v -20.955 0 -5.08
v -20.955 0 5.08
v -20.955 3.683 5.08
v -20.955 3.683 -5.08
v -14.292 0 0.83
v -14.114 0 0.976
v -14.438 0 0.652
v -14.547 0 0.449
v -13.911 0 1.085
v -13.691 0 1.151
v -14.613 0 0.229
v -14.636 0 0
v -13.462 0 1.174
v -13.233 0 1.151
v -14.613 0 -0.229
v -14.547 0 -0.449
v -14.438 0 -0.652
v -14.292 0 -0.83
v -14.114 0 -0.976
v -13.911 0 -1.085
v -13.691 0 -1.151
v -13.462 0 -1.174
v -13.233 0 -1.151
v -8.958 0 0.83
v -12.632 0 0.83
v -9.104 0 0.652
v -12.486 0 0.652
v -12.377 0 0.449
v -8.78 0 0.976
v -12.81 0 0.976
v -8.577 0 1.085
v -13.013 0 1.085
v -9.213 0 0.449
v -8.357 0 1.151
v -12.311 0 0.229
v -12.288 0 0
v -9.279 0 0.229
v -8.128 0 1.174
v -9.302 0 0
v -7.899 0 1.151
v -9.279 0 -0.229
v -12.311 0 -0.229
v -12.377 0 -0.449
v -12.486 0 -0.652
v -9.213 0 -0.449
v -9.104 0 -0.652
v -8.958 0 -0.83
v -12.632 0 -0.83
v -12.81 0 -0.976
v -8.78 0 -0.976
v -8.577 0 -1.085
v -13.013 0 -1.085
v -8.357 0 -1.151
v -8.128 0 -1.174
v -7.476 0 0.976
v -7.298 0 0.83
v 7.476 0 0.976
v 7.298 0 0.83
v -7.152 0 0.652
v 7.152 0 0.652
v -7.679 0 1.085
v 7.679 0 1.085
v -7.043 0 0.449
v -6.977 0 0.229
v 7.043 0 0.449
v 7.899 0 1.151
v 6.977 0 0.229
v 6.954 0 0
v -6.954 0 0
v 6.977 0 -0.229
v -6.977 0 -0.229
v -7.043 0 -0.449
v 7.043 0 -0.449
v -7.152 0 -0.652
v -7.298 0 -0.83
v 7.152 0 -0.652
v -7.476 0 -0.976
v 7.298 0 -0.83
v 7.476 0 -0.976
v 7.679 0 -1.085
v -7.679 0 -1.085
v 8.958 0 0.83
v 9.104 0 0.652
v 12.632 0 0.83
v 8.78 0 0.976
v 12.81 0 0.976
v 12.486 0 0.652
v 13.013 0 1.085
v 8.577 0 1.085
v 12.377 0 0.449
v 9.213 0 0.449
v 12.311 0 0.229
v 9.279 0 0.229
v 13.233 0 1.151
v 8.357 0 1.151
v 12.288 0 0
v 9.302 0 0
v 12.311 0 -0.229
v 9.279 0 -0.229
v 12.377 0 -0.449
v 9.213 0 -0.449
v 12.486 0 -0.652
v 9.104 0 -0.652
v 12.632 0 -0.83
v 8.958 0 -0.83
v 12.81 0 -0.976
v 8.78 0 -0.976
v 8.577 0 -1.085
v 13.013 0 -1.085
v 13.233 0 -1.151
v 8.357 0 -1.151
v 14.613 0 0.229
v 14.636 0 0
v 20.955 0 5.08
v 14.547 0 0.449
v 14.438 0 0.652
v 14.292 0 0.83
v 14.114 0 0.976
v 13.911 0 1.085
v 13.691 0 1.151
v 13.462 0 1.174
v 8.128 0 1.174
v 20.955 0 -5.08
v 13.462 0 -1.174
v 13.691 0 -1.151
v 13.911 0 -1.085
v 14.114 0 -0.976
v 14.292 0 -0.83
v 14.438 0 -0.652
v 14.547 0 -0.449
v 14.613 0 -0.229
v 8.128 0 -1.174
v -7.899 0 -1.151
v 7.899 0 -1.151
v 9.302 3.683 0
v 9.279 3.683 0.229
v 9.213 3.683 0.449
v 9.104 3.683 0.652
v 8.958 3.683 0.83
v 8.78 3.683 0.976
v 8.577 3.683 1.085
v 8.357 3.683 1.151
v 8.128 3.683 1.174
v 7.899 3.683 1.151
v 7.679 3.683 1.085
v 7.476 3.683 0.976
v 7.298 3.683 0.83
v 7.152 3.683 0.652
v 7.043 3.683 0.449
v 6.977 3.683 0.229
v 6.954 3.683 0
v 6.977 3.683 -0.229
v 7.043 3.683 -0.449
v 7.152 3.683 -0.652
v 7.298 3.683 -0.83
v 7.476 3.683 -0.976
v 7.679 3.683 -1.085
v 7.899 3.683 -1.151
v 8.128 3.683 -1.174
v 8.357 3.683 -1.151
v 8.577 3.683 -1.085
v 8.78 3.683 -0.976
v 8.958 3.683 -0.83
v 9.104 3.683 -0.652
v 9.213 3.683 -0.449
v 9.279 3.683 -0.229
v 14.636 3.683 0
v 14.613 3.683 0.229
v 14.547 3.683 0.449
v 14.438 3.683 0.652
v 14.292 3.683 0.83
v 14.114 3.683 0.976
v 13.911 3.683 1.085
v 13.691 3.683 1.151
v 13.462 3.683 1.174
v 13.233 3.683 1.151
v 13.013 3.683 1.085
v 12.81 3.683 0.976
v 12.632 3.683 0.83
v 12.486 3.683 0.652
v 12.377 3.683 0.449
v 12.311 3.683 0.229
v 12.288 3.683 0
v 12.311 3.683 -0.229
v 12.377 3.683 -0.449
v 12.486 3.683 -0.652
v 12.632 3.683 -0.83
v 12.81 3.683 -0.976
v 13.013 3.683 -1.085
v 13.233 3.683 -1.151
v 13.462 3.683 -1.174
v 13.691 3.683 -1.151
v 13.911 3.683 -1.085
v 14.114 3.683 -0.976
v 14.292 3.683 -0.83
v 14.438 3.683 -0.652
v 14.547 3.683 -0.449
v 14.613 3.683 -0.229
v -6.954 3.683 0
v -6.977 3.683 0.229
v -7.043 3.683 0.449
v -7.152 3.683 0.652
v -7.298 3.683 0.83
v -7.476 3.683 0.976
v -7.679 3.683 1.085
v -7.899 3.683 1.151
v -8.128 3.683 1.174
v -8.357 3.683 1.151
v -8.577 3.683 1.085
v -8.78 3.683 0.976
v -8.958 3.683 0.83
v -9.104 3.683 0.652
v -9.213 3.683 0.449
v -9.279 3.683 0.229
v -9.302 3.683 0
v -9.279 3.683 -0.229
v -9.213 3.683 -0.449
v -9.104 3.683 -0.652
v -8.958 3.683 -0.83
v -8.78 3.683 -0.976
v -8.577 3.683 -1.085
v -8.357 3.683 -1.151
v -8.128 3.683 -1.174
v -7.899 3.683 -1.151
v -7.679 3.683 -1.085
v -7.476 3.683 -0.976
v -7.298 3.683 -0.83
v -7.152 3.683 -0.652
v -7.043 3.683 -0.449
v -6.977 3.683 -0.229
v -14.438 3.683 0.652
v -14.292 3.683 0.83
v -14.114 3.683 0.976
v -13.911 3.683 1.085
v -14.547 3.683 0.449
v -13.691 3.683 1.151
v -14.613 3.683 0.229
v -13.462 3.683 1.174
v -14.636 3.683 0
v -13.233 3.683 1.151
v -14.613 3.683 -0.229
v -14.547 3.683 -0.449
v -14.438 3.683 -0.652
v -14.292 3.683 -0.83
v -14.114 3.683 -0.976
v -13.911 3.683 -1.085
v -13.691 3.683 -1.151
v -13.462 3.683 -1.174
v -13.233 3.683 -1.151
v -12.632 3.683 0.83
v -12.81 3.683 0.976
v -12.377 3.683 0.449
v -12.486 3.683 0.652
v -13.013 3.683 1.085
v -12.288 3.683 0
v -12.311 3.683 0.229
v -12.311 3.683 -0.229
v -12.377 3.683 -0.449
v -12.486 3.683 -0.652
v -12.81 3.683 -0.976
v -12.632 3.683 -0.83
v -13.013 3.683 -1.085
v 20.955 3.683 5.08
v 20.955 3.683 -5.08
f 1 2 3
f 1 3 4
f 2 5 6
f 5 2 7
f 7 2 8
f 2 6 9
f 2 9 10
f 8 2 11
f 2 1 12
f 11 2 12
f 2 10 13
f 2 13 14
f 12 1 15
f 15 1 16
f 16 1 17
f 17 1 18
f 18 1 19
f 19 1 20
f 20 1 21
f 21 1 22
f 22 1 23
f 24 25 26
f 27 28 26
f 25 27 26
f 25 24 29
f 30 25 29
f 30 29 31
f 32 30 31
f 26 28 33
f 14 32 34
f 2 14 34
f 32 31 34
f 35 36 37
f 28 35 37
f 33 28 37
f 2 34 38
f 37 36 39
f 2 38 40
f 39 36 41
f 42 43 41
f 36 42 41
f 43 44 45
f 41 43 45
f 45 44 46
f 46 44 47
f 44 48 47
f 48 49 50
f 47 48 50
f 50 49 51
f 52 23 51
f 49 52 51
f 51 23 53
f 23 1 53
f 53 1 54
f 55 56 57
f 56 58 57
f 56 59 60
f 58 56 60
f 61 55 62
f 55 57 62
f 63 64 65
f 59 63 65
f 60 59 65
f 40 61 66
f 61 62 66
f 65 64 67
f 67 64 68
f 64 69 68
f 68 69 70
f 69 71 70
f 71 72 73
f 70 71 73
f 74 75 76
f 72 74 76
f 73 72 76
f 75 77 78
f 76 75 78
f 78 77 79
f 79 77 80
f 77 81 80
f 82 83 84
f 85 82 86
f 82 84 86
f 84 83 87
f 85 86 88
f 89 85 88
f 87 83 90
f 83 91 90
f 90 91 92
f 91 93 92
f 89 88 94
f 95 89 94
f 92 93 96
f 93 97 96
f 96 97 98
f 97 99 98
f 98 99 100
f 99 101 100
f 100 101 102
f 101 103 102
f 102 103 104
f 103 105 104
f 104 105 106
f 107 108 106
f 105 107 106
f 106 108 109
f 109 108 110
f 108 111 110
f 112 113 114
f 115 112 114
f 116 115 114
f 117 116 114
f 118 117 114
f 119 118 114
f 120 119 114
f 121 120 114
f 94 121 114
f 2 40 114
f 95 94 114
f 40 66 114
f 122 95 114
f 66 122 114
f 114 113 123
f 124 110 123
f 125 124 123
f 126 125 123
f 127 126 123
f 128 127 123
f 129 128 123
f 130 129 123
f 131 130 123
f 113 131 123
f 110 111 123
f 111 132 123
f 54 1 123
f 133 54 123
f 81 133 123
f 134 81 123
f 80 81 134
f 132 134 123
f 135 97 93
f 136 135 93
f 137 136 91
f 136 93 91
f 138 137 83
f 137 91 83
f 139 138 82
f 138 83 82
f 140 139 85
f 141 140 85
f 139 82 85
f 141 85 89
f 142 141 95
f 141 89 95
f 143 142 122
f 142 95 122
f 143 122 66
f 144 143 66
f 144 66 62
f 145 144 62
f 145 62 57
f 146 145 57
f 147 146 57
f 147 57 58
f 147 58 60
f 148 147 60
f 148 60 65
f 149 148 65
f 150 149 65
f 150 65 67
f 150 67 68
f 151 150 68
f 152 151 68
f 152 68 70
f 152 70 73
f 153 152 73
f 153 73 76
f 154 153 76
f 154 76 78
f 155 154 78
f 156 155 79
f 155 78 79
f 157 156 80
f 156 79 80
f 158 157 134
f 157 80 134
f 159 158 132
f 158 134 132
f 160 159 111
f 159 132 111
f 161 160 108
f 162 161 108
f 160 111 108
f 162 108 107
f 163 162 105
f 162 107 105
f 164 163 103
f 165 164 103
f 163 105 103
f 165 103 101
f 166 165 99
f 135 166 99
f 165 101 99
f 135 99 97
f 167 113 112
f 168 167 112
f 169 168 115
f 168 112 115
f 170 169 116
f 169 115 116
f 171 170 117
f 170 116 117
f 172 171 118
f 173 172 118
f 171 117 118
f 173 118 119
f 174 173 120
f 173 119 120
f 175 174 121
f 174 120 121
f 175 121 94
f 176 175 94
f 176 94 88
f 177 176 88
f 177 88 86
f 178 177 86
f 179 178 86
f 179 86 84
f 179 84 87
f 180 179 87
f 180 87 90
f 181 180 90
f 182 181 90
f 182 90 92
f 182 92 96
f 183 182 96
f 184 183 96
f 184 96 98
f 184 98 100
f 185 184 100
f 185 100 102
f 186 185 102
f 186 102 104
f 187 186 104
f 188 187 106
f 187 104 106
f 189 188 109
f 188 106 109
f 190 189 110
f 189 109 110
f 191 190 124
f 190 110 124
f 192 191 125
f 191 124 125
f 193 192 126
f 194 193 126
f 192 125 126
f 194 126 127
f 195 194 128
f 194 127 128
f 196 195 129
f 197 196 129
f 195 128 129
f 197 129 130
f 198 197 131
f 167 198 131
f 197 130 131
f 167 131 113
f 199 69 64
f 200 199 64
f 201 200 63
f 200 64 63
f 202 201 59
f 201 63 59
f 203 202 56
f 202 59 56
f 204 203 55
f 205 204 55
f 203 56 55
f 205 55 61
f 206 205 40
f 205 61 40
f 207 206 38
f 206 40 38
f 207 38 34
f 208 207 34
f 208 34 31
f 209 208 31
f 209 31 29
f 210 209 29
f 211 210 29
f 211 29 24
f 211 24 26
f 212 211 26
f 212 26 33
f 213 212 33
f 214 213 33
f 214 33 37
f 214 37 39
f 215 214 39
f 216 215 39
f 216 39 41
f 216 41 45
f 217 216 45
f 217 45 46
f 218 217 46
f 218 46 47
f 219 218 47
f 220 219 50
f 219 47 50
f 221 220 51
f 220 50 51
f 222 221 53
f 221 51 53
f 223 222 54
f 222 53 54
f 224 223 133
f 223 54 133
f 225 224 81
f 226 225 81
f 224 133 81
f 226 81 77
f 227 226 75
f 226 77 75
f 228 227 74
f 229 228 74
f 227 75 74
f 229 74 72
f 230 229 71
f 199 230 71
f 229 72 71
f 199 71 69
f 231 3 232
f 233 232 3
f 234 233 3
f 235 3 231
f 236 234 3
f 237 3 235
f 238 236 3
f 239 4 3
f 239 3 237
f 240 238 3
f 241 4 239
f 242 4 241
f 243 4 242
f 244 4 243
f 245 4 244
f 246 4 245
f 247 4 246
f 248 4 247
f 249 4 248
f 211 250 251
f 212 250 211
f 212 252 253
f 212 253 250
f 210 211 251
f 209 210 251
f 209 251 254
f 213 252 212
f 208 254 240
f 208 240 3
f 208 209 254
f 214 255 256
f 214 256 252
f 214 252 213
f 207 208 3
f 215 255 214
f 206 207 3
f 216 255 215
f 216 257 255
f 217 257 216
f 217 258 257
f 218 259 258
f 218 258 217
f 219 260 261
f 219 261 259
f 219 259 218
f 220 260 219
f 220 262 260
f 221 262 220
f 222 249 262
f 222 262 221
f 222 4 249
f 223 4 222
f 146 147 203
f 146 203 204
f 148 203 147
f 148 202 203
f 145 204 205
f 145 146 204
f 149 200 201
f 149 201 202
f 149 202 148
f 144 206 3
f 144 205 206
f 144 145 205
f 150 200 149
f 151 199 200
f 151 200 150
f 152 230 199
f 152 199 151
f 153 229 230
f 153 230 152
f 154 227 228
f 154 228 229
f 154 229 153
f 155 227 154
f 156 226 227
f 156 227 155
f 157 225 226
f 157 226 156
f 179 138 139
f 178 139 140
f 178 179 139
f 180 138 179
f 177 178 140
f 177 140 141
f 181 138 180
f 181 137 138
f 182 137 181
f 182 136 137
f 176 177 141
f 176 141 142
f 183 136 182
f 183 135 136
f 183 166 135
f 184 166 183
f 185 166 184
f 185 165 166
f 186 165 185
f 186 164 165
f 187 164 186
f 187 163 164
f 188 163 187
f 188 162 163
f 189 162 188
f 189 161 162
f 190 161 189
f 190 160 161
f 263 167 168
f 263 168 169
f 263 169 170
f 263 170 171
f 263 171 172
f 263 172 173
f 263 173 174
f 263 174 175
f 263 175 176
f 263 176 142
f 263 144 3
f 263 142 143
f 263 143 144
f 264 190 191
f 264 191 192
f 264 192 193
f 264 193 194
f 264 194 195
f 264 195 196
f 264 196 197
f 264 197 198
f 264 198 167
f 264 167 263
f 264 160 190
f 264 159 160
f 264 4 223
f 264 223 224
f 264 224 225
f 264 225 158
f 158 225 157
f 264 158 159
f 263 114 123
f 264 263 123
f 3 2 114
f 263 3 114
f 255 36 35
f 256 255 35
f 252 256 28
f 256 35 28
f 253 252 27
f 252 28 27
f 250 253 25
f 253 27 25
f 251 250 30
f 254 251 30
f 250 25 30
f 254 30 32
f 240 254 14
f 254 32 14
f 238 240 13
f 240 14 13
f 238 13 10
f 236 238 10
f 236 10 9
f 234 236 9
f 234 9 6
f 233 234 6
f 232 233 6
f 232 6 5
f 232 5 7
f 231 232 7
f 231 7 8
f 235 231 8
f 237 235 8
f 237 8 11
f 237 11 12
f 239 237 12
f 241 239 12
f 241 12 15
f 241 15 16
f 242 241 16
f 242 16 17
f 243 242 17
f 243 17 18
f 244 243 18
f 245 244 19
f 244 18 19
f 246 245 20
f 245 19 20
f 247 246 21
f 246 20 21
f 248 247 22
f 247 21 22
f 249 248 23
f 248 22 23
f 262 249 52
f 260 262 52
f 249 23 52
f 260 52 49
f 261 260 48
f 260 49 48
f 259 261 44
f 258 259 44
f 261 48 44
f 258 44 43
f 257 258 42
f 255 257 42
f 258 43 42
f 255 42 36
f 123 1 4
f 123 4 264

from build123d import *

# Parameters (mm, degrees)
SKETCH1_W           = 41.91
SKETCH1_H           = 10.16
BOSS_EXTRUDE1_DEPTH = 3.683
SKETCH2_2_R         = 1.174037675
CUT_EXTRUDE1_DEPTH  = 4.683


with BuildPart() as part:
    # Sketch1 → Boss-Extrude1 (new body)
    with BuildSketch(Plane(origin=(0, 0, 0), x_dir=(1, 0, 0), z_dir=(0, 1, 0))):
        Rectangle(SKETCH1_W, SKETCH1_H)
    extrude(amount=BOSS_EXTRUDE1_DEPTH)

    # Sketch2<2> → Cut-Extrude1 (cut, through all)
    with BuildSketch(Plane.XZ):
        with Locations((-13.462, 0)):
            Circle(SKETCH2_2_R)
        with Locations((-8.128, 0)):
            Circle(SKETCH2_2_R)
        with Locations((8.128, 0)):
            Circle(SKETCH2_2_R)
        with Locations((13.462, 0)):
            Circle(SKETCH2_2_R)
    extrude(amount=-CUT_EXTRUDE1_DEPTH, mode=Mode.SUBTRACT)


solid = part.part
